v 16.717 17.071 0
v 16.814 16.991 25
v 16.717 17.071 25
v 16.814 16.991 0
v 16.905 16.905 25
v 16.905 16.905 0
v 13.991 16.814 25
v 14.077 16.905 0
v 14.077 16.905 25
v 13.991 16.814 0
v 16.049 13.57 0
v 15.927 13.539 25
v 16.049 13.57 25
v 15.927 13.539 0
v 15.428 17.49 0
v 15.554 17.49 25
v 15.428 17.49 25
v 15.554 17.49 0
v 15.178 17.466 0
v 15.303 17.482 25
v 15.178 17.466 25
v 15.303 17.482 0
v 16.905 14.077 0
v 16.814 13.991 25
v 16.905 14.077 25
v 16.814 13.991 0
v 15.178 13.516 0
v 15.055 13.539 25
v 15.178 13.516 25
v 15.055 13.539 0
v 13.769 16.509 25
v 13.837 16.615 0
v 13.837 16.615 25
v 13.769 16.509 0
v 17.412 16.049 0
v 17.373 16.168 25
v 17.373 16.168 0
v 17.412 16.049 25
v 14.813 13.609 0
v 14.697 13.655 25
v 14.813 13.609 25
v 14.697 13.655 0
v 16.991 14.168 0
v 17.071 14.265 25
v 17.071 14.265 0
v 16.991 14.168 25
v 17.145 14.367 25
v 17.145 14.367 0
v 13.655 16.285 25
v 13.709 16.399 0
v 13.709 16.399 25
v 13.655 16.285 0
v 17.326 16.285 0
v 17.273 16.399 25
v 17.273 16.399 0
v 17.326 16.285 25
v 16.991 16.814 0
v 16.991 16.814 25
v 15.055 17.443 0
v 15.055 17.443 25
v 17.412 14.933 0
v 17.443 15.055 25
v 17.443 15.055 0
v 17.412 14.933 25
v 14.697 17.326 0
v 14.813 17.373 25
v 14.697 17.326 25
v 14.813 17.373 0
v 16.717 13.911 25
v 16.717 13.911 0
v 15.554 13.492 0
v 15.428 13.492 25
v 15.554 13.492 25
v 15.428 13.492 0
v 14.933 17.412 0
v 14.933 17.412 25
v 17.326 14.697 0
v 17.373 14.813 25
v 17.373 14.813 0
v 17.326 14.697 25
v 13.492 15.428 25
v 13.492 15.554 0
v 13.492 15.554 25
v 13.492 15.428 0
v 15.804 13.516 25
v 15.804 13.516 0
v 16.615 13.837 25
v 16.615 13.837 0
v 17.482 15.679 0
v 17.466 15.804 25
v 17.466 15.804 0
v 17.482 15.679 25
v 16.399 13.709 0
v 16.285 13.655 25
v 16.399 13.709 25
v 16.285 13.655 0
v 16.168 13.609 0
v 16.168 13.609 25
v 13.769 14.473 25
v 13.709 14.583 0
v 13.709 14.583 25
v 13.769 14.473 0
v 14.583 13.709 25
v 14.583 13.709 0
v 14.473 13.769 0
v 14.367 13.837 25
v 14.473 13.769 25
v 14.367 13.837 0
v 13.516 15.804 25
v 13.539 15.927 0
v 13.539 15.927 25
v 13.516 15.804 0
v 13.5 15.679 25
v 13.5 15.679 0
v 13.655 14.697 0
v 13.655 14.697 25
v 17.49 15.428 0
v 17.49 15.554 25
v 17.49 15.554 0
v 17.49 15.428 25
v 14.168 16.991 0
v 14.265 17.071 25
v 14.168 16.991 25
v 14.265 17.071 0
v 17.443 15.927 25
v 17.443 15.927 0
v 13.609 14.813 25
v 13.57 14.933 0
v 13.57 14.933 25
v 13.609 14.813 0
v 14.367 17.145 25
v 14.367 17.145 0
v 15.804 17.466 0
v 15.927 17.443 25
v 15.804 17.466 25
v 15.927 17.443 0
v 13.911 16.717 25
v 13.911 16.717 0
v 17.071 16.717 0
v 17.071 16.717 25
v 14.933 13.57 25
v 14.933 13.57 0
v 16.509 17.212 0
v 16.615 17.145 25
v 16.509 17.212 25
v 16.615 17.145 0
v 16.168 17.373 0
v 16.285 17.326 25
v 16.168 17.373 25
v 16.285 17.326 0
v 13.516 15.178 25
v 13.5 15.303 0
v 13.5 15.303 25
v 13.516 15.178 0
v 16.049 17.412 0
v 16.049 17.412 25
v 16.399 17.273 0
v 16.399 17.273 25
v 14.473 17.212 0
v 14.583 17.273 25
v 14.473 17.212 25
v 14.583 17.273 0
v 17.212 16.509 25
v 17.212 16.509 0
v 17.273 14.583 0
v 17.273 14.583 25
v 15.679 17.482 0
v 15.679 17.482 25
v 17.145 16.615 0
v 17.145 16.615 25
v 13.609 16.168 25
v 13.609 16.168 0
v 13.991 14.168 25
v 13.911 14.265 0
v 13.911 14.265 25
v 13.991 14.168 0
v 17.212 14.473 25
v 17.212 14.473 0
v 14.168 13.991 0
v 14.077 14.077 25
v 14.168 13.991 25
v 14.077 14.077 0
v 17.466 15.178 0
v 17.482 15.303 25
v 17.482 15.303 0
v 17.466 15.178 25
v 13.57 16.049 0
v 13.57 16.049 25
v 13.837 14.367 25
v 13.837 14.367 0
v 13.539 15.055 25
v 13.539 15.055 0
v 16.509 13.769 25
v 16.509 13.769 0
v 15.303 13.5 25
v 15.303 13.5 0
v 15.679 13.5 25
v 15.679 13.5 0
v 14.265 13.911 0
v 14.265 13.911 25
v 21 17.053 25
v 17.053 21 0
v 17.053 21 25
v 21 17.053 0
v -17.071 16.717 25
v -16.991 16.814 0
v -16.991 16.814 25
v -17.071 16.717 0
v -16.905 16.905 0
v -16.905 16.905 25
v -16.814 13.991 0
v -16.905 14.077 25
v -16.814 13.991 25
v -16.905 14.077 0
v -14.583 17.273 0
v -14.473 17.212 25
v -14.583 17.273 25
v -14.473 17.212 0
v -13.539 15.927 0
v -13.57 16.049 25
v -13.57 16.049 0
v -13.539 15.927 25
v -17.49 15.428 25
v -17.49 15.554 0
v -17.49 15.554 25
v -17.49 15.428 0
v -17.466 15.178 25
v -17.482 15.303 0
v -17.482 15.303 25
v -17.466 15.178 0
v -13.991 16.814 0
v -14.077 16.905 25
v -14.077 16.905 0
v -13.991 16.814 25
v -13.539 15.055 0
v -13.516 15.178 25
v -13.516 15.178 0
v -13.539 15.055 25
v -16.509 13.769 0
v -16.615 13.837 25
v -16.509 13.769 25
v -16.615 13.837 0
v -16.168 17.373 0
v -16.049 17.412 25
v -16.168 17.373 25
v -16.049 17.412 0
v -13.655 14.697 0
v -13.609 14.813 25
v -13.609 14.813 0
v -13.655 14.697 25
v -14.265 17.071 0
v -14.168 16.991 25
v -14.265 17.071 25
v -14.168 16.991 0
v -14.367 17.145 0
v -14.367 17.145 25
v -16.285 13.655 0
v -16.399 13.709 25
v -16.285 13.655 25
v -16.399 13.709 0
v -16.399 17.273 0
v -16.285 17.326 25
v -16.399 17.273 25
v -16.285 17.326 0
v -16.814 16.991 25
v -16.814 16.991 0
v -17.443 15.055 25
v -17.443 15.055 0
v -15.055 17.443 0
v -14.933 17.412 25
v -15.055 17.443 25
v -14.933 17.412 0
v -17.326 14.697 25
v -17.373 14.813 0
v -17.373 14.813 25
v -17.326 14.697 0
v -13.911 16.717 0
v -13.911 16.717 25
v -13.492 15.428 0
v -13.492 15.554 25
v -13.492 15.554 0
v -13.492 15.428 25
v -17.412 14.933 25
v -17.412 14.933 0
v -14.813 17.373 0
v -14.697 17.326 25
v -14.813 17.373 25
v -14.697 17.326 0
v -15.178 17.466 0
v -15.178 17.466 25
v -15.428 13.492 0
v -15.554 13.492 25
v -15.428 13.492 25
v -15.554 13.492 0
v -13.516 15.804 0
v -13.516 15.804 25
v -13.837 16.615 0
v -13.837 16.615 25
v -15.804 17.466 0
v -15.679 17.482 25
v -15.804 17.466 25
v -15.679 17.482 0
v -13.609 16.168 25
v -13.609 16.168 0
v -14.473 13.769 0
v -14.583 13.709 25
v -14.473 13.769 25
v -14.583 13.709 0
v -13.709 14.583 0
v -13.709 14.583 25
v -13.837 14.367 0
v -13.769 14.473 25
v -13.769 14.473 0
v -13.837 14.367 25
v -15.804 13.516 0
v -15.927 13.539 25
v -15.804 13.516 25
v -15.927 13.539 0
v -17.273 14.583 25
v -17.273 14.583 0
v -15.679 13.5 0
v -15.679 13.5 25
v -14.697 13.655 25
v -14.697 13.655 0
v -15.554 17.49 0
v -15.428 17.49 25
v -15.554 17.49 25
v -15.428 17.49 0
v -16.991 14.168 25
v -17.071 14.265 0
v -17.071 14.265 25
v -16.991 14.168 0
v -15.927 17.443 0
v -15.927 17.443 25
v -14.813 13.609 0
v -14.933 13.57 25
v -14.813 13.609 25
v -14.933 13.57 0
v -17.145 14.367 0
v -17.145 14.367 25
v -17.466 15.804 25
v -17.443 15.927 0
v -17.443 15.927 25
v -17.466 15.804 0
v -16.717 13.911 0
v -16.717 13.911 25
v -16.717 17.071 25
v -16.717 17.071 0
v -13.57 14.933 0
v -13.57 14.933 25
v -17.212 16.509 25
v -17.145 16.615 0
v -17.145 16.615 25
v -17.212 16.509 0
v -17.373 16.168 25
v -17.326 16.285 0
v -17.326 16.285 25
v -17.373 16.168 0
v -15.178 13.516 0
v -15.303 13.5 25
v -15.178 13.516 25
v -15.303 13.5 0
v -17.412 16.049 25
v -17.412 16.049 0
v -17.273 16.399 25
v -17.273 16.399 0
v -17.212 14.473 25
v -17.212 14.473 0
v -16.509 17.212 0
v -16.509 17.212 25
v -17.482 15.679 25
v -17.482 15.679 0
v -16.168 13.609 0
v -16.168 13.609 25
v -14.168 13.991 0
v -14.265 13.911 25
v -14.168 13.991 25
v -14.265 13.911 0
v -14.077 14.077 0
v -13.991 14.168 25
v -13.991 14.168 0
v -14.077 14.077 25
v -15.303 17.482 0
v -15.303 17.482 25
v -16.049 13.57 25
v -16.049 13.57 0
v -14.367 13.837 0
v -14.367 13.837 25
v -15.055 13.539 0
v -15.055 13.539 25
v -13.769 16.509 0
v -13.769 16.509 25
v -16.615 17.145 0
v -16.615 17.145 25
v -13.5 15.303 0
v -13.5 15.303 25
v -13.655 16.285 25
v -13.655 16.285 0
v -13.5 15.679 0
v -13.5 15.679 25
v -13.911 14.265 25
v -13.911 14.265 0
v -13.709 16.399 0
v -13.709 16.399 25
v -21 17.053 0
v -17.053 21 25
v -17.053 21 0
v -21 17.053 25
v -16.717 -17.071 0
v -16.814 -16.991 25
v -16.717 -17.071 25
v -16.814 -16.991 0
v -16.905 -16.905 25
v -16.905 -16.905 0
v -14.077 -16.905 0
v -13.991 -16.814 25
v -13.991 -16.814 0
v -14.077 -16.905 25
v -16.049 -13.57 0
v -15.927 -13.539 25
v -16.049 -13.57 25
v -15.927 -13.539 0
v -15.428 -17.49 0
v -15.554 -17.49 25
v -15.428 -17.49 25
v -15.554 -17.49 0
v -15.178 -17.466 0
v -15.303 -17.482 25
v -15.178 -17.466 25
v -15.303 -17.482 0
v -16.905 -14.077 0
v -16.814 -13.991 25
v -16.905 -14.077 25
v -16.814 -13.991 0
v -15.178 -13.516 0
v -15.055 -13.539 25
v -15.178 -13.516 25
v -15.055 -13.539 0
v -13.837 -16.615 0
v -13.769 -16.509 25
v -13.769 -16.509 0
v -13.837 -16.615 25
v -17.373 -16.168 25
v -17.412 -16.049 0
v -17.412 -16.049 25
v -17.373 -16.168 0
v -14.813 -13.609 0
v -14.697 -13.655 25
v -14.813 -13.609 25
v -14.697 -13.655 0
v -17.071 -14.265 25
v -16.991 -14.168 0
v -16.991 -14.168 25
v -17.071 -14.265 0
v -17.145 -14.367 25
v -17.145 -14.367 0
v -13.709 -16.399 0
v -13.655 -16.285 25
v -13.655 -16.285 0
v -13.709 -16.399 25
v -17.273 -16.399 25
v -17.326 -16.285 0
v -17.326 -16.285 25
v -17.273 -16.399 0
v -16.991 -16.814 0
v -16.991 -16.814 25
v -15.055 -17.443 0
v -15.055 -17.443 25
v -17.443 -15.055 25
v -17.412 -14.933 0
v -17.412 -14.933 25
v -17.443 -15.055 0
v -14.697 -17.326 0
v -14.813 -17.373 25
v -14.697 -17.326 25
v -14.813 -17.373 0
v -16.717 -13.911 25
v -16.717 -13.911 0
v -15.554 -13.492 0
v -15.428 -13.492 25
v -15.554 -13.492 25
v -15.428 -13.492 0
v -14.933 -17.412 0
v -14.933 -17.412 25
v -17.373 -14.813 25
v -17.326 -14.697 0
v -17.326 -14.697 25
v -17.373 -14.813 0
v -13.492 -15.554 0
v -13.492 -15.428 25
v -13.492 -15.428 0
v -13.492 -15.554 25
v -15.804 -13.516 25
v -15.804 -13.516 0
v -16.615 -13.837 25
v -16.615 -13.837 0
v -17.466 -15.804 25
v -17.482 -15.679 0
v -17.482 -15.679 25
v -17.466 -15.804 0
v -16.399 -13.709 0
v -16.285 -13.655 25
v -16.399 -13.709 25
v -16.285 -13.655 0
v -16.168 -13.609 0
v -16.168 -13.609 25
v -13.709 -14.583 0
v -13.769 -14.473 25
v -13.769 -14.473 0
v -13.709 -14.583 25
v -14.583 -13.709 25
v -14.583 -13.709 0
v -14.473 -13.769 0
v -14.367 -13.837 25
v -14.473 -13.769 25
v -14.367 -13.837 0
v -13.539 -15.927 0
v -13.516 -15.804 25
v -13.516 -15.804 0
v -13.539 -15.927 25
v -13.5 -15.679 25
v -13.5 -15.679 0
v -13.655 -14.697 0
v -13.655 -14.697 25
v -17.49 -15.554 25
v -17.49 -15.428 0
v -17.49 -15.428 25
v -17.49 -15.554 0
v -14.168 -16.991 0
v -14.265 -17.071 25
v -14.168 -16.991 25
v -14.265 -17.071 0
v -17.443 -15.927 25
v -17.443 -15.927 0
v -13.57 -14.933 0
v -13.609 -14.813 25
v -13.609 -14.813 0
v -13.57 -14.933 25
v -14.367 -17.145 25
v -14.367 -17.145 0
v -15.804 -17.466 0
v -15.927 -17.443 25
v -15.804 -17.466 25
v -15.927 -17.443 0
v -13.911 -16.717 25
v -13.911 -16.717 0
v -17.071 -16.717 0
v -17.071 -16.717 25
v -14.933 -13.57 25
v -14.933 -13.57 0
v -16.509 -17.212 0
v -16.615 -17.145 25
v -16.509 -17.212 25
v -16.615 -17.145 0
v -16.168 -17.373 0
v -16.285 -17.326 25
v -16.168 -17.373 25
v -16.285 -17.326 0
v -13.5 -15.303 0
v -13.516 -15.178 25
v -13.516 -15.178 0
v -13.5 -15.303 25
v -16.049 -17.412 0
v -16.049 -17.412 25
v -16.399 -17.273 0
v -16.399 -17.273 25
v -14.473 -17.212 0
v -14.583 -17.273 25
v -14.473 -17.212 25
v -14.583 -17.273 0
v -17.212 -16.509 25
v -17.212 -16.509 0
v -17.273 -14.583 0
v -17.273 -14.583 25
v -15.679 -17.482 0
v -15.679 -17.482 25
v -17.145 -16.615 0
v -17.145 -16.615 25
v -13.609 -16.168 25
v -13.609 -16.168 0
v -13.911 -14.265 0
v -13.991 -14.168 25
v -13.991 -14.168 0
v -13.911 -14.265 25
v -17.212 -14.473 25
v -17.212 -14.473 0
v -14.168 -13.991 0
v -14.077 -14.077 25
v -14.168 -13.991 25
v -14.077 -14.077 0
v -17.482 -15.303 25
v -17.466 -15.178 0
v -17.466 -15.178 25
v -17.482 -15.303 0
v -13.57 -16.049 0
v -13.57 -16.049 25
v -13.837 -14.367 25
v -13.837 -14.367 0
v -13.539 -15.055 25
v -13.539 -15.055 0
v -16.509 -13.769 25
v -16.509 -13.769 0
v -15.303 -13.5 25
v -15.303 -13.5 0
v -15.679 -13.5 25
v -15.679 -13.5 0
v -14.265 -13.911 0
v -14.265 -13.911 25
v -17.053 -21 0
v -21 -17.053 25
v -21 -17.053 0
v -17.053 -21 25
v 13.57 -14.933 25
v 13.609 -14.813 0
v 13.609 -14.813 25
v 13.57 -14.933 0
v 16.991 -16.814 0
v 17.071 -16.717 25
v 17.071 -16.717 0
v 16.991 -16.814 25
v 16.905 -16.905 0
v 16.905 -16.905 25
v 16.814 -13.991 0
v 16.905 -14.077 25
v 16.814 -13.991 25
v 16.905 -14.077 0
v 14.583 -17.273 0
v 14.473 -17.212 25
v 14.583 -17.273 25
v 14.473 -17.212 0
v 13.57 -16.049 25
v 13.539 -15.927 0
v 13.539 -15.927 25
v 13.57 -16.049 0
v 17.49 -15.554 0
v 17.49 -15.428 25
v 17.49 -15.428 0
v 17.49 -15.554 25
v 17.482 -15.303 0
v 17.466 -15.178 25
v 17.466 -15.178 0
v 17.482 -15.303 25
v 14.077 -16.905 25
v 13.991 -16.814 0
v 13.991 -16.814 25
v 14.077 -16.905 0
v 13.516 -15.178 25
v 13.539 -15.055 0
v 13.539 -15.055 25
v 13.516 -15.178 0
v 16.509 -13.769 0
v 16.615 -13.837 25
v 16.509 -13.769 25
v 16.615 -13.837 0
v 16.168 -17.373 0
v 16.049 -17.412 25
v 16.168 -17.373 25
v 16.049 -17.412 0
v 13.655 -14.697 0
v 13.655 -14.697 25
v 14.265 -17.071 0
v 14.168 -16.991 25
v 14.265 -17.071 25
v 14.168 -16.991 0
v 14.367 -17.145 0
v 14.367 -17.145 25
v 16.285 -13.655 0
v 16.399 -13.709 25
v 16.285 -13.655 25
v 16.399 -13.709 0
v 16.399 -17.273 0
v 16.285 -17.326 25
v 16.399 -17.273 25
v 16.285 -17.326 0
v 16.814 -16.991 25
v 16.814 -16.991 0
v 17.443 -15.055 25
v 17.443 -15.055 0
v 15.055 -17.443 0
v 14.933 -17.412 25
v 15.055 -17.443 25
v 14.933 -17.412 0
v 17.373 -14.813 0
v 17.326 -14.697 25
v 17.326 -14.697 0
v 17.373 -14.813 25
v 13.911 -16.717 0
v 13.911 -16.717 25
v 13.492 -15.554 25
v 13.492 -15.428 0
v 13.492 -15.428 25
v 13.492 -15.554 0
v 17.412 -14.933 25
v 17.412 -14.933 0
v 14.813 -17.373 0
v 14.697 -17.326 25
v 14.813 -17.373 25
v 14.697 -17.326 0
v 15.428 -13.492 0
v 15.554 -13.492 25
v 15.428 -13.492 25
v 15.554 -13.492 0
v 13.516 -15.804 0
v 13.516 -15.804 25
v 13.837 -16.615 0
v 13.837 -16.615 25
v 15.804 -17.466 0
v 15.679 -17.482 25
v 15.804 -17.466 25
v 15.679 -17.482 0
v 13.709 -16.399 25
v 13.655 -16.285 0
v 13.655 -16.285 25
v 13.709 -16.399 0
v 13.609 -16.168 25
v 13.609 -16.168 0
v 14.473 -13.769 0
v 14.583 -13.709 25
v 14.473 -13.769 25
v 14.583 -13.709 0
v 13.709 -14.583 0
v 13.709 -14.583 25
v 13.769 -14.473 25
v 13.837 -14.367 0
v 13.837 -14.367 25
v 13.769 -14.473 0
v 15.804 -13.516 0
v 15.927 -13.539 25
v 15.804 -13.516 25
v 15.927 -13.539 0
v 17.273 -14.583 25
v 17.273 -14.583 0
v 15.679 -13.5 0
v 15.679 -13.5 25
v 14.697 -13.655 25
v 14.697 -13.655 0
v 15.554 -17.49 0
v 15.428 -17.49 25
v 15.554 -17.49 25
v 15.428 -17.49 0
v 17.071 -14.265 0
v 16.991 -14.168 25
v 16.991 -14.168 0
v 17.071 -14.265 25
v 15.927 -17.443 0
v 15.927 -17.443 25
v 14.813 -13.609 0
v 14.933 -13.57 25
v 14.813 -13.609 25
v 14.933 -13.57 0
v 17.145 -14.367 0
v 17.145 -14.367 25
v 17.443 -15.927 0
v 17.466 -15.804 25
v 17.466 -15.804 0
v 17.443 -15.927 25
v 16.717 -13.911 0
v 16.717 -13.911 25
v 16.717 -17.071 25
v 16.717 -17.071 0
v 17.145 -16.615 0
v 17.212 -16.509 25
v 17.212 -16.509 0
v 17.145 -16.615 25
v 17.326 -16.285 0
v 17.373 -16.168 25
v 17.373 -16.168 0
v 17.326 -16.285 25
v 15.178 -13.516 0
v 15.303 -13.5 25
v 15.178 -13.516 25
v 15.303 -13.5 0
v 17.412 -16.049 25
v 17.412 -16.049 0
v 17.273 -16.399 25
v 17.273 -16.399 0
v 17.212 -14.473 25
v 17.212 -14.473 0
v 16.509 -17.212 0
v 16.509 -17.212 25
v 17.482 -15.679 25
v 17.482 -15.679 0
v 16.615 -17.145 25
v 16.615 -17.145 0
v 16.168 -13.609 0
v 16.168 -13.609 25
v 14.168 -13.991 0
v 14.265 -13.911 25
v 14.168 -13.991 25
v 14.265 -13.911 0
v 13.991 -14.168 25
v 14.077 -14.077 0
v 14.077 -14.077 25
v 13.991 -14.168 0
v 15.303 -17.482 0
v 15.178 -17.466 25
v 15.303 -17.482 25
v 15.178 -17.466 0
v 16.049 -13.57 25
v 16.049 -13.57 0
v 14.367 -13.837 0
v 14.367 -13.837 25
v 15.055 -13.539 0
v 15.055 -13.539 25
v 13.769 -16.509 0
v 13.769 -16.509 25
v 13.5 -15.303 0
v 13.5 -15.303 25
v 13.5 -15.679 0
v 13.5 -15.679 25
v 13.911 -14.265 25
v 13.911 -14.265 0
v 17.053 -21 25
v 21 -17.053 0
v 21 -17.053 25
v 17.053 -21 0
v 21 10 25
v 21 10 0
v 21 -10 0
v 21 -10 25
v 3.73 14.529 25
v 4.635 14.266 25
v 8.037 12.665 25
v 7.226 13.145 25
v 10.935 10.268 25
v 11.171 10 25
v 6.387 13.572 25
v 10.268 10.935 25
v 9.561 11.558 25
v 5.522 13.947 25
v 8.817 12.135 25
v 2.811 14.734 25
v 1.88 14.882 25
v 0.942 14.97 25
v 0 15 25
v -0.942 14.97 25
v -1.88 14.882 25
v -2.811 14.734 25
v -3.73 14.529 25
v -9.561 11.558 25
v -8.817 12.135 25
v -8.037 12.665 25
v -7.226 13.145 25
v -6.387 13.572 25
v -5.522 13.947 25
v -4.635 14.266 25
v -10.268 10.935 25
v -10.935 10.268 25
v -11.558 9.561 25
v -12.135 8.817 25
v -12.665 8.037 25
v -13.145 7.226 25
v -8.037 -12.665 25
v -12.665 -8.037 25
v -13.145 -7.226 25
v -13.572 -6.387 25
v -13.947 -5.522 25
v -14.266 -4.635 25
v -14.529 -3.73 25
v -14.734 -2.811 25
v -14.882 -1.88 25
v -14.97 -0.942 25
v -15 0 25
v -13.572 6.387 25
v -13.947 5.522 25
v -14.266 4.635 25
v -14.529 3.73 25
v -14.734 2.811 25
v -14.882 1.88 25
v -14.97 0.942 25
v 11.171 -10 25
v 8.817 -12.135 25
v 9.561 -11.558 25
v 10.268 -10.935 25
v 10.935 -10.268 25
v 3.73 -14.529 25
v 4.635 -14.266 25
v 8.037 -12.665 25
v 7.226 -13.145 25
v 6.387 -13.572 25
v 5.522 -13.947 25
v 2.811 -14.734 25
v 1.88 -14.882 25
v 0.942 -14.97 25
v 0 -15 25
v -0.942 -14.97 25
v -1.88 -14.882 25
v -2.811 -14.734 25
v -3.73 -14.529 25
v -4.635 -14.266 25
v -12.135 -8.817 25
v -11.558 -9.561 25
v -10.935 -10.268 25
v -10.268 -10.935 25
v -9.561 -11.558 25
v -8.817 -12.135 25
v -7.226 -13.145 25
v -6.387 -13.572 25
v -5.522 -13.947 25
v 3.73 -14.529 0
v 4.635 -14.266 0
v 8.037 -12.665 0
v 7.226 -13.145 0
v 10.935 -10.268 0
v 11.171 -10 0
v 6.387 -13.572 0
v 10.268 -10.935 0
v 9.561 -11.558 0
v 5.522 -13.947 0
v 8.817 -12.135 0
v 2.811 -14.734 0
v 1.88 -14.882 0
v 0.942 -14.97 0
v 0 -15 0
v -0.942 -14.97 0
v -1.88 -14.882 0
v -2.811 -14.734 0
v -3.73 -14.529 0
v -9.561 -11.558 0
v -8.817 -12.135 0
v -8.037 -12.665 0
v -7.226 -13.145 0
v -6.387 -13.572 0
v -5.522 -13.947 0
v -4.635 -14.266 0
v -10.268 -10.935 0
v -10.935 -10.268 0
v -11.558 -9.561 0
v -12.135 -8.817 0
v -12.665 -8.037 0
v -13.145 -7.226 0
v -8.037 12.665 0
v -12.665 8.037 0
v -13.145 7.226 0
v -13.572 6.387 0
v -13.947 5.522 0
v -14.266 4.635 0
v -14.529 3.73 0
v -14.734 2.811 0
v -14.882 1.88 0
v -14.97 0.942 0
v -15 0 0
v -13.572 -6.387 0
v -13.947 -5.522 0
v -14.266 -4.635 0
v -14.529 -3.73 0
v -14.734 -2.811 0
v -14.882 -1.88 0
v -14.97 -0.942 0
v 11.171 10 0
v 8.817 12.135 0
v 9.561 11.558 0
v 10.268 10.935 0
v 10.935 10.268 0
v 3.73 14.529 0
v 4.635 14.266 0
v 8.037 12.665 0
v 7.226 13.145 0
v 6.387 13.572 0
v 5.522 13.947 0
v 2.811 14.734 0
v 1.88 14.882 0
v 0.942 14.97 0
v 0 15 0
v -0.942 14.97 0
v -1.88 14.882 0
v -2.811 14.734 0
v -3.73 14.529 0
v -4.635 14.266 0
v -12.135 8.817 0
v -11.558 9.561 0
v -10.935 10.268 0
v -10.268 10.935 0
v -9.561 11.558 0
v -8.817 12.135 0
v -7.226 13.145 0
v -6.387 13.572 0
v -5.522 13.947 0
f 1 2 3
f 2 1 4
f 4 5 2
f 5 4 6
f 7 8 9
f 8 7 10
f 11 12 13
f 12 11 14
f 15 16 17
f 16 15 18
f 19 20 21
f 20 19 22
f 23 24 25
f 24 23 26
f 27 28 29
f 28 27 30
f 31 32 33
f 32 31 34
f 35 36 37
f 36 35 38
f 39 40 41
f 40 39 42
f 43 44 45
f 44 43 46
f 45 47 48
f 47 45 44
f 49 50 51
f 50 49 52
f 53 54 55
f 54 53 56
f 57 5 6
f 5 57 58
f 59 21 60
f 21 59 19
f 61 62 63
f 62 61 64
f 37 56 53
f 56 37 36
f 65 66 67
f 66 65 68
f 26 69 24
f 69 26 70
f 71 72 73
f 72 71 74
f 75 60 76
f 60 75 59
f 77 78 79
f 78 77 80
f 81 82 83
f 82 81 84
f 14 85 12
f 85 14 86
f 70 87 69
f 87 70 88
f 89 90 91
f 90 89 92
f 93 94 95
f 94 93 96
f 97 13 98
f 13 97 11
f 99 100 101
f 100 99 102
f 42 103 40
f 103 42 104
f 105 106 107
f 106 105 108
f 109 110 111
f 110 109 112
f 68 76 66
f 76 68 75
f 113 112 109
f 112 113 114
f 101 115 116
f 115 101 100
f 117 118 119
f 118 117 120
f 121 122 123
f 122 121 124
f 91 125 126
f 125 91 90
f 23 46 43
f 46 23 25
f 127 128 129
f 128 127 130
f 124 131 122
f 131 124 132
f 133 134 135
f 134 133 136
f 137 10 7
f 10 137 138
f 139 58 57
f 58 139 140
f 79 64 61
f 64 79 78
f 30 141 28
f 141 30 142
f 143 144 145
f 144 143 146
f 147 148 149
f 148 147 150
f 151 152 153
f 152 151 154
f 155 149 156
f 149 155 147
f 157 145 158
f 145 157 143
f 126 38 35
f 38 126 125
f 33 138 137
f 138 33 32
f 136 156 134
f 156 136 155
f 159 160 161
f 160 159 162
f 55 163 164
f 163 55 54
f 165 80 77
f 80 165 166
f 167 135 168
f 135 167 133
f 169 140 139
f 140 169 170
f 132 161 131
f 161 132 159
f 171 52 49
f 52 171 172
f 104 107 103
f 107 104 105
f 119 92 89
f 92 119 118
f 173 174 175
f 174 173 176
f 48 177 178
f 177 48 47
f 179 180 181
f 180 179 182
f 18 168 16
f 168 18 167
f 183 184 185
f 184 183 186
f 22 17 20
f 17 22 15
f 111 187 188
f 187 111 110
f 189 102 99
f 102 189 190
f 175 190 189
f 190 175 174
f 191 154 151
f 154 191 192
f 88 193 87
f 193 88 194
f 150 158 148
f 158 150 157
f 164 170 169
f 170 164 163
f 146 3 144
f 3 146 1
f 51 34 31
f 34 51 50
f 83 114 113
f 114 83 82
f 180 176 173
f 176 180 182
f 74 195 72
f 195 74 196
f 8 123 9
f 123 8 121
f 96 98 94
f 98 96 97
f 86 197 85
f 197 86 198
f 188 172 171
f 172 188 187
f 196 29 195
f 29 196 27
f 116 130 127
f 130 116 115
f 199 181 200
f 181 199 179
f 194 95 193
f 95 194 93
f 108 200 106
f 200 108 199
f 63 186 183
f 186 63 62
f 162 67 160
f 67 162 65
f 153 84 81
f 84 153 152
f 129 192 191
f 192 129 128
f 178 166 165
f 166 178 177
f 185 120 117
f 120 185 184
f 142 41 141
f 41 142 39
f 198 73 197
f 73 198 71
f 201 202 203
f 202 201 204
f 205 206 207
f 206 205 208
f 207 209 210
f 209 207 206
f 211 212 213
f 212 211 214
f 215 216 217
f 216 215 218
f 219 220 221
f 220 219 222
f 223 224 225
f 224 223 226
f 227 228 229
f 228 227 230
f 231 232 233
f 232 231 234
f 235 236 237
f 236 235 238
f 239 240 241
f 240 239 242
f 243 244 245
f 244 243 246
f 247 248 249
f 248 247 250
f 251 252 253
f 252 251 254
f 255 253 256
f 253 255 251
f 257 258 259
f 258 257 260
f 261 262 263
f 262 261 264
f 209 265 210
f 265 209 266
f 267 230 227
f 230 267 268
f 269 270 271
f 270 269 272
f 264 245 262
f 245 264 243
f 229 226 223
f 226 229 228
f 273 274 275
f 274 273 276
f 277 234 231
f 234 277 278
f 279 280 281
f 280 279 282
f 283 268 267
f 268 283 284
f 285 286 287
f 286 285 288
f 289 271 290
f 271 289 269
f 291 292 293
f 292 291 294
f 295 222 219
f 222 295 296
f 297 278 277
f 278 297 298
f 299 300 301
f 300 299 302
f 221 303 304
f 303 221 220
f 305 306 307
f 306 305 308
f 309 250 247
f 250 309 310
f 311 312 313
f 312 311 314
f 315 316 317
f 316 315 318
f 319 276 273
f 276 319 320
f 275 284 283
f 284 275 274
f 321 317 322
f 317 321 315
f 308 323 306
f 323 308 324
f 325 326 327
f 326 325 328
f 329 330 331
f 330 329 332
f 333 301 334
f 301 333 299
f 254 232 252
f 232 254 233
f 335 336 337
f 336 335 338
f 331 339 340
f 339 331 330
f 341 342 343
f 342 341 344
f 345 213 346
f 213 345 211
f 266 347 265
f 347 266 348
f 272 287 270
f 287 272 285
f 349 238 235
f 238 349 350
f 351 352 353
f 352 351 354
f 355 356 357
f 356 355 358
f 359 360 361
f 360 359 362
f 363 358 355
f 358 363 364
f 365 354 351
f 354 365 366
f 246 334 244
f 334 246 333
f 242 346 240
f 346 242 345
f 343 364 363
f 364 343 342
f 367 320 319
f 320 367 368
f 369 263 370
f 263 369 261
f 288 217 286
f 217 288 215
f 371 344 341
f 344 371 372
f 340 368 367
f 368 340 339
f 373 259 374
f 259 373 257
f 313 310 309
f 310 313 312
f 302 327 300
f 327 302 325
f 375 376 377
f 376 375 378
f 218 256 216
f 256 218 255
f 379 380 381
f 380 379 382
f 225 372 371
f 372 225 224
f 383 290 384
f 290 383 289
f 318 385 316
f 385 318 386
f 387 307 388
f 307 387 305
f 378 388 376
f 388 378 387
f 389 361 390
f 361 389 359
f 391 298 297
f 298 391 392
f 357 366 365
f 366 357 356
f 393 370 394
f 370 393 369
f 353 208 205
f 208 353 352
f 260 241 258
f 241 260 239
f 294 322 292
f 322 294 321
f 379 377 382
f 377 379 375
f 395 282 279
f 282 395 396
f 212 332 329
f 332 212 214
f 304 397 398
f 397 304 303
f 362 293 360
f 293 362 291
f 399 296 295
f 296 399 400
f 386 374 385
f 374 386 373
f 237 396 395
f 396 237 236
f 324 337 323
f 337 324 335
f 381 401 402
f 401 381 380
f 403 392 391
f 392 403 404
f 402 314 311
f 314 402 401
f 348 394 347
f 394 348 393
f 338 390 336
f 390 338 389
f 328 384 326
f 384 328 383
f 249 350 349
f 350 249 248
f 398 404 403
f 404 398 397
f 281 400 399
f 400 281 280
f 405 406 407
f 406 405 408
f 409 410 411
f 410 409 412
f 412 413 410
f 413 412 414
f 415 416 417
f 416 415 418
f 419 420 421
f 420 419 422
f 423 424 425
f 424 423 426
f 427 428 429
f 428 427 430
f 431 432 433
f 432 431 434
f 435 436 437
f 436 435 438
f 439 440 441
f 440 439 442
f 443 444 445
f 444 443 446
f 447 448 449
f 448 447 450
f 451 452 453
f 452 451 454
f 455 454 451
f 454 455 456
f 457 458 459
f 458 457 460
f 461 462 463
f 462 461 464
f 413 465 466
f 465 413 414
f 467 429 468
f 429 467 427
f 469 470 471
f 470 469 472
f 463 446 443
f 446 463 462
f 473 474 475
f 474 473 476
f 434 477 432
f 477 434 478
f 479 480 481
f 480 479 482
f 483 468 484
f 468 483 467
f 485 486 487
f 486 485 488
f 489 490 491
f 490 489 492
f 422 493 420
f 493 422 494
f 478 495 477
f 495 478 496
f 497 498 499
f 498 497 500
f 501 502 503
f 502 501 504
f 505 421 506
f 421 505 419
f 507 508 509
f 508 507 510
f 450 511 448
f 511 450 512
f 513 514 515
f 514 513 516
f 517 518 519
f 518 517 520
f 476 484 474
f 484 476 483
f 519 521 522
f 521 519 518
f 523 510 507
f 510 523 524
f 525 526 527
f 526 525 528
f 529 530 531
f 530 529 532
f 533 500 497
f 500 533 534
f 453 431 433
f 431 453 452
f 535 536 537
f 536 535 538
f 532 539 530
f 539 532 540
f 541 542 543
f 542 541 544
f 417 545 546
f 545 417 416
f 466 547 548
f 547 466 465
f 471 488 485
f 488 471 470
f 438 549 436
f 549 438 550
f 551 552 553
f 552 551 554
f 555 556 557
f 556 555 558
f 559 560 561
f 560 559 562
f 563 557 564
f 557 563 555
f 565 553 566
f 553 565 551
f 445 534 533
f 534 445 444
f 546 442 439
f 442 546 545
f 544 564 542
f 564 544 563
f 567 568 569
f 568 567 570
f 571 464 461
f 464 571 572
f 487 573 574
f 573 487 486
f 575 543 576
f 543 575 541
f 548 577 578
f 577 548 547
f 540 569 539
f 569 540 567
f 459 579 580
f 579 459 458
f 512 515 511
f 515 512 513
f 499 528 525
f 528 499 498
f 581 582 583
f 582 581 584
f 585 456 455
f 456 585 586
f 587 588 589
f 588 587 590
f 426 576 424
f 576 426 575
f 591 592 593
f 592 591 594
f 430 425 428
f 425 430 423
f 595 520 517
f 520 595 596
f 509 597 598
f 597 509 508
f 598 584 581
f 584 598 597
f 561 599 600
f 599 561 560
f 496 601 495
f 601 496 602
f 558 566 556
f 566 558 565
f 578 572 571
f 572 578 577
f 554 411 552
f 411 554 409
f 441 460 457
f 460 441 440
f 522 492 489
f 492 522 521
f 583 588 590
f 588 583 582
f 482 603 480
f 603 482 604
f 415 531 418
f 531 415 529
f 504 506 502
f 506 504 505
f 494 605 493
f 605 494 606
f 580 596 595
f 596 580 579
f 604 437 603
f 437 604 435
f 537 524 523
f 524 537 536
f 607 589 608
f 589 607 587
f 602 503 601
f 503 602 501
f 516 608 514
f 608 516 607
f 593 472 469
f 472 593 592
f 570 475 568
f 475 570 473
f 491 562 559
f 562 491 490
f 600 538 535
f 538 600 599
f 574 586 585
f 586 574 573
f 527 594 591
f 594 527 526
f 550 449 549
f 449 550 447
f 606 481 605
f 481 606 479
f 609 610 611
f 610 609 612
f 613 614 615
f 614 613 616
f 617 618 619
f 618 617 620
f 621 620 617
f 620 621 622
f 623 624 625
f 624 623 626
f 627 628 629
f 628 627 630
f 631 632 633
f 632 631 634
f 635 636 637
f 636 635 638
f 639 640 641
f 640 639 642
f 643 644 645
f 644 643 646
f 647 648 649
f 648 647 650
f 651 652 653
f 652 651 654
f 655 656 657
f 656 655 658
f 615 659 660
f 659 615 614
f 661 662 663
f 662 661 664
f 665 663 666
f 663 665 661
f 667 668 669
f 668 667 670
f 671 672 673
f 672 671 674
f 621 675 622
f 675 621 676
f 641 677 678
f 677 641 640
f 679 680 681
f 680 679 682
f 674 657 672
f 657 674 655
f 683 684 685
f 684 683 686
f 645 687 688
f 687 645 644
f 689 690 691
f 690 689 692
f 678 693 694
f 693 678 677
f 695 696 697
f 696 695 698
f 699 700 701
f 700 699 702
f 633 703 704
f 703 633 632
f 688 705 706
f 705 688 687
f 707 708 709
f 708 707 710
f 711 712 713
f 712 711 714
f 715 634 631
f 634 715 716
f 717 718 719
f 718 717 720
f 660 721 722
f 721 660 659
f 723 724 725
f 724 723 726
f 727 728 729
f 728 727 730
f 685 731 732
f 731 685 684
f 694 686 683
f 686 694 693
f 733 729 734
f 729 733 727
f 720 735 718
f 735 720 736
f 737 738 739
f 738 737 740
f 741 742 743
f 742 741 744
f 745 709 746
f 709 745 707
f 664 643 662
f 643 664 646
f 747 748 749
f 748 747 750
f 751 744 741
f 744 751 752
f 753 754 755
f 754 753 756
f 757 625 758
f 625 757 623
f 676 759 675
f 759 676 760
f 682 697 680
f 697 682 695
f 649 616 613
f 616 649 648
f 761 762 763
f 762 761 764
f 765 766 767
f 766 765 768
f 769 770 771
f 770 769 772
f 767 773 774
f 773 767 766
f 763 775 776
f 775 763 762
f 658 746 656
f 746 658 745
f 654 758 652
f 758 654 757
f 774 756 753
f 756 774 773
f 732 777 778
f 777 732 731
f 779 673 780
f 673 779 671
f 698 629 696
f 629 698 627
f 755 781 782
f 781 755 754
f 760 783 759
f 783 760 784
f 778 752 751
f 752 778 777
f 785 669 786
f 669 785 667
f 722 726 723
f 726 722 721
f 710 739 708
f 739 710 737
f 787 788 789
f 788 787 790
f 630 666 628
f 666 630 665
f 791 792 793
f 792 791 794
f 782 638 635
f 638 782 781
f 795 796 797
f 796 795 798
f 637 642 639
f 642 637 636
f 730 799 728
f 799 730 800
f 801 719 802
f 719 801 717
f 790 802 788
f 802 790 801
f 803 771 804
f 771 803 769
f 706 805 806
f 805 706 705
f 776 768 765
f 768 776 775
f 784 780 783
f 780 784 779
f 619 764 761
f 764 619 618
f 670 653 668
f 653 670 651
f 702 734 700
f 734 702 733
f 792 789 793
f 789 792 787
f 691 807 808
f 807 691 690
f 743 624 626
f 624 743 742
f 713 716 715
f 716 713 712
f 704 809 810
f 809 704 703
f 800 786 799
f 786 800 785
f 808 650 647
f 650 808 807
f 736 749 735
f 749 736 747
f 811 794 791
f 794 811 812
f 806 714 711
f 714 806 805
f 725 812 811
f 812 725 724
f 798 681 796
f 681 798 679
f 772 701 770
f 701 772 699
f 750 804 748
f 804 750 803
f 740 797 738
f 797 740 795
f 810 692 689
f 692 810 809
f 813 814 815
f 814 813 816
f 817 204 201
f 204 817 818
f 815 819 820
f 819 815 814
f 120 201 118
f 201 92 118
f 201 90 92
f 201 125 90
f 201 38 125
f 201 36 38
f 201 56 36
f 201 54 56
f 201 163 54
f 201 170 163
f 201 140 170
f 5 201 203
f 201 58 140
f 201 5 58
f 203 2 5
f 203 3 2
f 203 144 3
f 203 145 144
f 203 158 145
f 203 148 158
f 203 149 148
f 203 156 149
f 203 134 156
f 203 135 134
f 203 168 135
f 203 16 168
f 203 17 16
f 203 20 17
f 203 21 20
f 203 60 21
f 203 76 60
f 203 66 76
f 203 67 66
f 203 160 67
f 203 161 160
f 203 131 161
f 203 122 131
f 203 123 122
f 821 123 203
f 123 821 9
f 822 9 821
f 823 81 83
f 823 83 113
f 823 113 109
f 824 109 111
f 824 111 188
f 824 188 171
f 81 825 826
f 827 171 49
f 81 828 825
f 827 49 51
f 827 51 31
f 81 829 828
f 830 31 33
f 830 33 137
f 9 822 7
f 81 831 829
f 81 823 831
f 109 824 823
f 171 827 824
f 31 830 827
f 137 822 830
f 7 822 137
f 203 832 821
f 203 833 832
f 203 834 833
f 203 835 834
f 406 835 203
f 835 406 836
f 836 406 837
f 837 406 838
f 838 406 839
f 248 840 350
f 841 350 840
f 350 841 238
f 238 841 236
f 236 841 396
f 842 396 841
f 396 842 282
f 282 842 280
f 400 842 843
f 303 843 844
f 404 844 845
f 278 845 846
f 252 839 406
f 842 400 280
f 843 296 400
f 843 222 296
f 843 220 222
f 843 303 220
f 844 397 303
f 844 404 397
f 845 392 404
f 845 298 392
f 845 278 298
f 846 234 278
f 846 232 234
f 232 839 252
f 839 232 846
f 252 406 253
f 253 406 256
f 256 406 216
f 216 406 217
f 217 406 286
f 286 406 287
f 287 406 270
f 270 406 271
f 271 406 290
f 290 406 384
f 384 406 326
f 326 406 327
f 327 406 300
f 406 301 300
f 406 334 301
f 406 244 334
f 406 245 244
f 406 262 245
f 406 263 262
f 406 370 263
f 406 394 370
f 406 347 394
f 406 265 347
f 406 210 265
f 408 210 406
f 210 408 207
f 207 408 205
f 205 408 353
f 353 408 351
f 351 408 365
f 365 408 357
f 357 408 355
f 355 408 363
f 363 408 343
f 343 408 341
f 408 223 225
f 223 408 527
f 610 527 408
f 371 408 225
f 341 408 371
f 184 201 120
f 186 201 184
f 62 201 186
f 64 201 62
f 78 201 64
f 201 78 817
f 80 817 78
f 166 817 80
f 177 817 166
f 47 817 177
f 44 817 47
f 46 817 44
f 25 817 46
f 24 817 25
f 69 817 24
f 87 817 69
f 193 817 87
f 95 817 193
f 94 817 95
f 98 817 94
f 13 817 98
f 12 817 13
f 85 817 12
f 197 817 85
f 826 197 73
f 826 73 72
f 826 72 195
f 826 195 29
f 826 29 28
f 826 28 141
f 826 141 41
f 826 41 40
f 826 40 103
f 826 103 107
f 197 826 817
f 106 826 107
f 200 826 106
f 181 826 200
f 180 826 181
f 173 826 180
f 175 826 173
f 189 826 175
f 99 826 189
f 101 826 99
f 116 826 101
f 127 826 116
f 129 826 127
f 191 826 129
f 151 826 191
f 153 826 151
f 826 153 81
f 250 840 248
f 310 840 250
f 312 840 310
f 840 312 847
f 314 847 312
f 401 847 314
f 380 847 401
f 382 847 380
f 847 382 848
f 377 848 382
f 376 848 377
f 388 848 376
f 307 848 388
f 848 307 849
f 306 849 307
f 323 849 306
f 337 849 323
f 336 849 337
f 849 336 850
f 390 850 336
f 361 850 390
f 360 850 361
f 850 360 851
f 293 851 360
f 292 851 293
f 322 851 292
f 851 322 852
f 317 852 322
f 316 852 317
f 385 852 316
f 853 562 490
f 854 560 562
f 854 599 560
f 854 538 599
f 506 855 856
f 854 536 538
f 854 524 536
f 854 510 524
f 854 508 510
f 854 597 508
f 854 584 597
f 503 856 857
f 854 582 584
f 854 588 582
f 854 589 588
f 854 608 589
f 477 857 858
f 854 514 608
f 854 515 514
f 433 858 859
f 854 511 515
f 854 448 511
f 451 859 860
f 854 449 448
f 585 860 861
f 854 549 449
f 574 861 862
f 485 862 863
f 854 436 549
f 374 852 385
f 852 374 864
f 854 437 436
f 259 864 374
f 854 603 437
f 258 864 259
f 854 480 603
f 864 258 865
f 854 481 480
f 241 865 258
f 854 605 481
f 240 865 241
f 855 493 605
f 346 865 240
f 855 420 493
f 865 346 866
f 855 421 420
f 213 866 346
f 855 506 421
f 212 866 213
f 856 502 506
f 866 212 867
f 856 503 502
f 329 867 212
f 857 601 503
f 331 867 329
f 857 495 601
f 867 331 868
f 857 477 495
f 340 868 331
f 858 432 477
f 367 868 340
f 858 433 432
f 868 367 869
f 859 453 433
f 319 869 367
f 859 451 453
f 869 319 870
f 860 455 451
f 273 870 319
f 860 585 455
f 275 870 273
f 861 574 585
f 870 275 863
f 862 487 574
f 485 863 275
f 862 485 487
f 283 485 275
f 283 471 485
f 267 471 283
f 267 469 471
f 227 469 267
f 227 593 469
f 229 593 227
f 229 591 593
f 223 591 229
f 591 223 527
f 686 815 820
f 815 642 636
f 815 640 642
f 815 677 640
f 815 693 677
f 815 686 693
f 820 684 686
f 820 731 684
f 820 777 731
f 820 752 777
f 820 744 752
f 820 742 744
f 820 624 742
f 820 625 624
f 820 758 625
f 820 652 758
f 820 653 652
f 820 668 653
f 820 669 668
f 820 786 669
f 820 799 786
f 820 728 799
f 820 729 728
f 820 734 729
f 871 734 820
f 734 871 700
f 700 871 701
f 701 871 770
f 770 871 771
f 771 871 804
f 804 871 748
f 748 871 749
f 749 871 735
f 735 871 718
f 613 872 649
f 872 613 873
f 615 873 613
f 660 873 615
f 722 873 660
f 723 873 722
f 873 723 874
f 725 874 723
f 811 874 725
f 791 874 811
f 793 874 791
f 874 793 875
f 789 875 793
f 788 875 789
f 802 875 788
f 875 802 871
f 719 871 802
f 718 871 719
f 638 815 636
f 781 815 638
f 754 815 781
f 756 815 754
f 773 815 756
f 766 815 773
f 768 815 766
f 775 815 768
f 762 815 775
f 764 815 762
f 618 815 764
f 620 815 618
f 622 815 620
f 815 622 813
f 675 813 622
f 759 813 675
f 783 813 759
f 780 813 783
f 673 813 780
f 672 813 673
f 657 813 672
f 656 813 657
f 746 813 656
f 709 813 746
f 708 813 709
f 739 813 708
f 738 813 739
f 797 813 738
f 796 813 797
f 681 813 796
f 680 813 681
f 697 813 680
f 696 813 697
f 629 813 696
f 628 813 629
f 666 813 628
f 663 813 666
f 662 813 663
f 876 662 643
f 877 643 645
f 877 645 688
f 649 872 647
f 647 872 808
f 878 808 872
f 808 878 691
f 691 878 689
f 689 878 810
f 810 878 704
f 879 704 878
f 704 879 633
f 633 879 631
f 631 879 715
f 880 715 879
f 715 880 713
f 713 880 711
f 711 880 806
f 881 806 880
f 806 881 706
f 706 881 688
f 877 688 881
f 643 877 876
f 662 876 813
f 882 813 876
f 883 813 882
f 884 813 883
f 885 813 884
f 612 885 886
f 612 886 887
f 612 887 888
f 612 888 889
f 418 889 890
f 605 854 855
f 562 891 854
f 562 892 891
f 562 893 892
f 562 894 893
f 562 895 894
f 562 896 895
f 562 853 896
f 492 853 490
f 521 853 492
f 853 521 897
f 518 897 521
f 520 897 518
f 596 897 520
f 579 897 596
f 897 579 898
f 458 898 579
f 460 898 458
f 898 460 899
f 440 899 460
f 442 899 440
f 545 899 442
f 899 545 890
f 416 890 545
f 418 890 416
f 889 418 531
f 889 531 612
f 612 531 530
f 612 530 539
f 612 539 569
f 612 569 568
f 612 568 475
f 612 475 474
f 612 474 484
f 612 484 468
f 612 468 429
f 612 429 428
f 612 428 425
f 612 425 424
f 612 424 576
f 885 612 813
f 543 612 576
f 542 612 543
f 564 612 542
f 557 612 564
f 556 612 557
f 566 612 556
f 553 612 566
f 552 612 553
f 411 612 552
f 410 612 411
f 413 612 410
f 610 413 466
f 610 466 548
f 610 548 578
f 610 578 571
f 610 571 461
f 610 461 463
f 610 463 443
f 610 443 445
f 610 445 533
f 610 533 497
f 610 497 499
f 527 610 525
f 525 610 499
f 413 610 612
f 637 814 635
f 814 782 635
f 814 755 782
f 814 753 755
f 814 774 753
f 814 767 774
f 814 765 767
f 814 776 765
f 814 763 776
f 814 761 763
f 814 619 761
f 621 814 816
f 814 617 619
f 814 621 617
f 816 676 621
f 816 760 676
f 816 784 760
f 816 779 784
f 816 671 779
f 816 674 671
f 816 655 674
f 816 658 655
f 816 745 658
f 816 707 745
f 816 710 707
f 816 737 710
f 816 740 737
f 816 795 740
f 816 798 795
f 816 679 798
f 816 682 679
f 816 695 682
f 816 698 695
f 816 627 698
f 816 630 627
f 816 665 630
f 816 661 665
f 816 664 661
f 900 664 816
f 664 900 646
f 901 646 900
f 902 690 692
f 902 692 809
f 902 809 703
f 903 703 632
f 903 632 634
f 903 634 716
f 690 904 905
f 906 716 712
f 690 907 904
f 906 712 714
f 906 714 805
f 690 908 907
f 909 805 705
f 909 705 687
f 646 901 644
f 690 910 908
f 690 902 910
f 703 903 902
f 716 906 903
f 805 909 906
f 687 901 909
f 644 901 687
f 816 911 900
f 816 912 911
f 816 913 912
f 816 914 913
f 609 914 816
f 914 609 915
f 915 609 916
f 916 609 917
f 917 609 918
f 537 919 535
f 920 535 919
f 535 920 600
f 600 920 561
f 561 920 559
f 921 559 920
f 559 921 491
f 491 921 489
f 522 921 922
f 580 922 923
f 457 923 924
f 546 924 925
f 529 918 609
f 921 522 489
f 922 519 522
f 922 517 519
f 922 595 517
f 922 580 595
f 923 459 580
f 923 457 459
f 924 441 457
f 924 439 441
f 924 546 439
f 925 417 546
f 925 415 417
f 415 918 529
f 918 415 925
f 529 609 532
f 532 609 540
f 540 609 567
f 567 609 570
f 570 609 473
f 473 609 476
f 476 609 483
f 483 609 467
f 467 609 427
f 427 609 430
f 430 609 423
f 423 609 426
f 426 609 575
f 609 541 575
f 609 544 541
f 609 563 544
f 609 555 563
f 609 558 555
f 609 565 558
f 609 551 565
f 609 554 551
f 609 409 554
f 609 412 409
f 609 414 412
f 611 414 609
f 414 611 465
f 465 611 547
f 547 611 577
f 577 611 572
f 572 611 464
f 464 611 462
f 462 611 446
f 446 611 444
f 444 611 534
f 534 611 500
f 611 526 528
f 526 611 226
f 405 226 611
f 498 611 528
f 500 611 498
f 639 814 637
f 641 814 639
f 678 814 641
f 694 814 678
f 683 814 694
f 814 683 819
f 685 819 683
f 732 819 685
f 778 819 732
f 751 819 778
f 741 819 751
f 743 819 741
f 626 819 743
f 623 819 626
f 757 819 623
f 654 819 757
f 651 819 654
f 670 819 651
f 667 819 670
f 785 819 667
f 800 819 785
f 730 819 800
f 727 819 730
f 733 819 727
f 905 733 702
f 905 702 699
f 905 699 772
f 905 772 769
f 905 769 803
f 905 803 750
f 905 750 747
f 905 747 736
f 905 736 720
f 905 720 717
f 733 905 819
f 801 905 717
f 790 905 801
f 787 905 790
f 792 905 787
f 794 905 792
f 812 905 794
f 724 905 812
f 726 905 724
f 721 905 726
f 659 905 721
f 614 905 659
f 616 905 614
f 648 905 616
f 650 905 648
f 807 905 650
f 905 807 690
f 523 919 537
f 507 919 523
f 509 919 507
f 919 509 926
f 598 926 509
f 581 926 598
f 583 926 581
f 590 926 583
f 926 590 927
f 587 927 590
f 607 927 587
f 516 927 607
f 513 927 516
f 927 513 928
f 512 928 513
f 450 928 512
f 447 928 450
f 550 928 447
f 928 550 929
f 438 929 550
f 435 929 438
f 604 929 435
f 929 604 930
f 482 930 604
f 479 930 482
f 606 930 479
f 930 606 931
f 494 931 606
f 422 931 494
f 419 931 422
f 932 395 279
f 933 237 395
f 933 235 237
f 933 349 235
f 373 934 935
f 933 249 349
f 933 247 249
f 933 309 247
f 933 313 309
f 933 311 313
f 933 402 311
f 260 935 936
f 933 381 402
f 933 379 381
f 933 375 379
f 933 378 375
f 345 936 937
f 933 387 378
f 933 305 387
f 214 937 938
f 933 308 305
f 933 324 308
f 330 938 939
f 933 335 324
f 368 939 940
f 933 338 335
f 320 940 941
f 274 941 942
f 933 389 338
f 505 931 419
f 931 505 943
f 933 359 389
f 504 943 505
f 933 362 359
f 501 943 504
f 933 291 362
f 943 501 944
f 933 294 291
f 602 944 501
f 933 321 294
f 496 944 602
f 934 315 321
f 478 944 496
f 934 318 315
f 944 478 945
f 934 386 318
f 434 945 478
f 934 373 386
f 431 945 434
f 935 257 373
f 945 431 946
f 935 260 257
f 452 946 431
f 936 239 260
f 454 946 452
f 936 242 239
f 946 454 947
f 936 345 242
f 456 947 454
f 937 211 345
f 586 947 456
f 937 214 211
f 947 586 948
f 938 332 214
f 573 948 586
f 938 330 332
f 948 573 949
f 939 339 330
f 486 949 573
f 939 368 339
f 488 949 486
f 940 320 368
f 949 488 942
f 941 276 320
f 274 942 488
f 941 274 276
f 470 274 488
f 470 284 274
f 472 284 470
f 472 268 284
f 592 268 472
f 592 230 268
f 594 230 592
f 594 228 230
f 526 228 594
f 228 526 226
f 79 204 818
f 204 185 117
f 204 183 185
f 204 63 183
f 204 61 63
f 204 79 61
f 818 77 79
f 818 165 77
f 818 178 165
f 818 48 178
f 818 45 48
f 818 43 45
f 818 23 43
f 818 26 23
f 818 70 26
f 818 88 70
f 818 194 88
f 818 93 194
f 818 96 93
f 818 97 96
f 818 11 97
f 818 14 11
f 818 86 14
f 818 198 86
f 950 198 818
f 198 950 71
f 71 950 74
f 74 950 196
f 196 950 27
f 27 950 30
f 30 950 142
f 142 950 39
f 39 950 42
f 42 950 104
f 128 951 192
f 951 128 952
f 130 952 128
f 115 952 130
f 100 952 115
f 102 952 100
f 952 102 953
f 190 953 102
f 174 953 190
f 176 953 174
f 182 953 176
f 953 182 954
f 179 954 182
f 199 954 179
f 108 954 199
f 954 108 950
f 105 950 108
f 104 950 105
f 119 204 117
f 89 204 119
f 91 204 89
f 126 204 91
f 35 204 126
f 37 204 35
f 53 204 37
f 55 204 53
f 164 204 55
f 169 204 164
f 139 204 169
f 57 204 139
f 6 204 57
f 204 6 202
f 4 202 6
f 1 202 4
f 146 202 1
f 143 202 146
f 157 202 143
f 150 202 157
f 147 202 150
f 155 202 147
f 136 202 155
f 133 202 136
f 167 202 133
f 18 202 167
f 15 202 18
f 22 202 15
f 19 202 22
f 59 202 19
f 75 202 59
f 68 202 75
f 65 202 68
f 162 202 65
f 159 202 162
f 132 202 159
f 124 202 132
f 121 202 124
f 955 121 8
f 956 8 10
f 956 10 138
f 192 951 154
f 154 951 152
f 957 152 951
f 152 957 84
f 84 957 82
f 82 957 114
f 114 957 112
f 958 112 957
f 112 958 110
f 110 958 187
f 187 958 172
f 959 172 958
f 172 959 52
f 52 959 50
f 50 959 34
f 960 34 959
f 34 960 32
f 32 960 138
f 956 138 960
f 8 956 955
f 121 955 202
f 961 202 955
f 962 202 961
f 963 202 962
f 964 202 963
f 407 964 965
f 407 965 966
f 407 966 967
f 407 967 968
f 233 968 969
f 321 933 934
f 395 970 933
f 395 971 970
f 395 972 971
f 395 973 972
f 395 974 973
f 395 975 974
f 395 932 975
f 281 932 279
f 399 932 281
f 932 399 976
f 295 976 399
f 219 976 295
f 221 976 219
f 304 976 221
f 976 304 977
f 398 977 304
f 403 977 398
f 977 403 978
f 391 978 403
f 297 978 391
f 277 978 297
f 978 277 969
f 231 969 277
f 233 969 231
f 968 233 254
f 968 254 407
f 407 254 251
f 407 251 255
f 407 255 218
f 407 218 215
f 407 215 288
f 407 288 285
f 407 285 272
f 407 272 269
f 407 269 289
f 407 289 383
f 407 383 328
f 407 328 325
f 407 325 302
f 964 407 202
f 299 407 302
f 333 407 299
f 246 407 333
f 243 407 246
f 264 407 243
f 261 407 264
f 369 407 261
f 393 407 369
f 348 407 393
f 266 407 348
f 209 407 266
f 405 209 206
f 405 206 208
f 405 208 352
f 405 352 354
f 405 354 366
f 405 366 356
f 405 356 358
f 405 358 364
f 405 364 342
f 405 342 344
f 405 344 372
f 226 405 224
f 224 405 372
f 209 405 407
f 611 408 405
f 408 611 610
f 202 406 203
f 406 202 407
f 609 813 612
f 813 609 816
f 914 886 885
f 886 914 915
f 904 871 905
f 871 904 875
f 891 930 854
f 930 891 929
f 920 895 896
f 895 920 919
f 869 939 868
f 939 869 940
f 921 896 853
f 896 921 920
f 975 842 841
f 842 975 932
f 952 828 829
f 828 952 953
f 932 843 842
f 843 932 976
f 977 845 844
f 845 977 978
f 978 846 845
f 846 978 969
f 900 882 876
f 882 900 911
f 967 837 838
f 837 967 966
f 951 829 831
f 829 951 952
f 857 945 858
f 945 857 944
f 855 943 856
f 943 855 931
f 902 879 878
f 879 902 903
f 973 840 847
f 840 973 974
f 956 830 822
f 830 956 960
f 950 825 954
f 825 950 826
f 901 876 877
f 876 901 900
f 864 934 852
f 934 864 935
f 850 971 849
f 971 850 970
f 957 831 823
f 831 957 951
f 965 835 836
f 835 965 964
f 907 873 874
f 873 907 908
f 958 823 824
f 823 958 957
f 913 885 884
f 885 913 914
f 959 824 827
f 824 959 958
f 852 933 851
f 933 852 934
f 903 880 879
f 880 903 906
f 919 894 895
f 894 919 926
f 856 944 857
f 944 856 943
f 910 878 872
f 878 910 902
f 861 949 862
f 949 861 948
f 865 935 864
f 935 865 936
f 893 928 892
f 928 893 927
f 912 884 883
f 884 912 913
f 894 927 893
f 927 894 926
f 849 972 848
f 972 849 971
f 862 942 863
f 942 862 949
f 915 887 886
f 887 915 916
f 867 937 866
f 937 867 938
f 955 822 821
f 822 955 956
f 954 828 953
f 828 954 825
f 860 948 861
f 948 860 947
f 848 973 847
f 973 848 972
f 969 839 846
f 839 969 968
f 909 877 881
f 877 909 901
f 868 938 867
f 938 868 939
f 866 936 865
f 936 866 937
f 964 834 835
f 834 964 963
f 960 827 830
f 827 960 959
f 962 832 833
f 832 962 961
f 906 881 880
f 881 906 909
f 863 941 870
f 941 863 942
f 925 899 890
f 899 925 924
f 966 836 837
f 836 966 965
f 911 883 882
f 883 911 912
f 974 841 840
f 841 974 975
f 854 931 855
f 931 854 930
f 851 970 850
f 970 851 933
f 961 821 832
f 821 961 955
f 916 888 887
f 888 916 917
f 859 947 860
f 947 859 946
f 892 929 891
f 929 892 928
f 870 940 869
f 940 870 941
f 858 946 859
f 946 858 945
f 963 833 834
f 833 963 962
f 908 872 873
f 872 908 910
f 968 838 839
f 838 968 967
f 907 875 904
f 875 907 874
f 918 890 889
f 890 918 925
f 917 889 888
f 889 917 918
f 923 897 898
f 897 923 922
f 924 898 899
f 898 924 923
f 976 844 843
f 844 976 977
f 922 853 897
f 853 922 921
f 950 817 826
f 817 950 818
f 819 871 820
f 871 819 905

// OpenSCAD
block_heigth=25;
hole_dia = 30;
cut_out = 20;
bolt_circle_dia = 43.815;
bolt_dia = 4;
m_size = 42;
$fn=100;

difference()
{
    translate([m_size * -0.5, m_size * -0.5])
    {
        cube([m_size, m_size, block_heigth]);
    }
    translate([0,0,-0.001])
    {
        cylinder(d=hole_dia,h= block_heigth + 0.002);
    }
    translate([0, cut_out * -0.5,-0.001])
    {
        cube([m_size/2 + 0.001, cut_out, block_heigth + 0.002]);
    }
    for(i=[0:3])
    {
        rotate([0,0,45 + 90 * i])
        {
            translate([bolt_circle_dia / 2, 0,-0.001])
            {
                cylinder(d=bolt_dia,h= block_heigth + 0.002);
            }
            translate([bolt_circle_dia / 2 +5, -5,-0.001])
            {
                cube([10, 10, block_heigth + 0.002]);
            }
        }
    }
}
